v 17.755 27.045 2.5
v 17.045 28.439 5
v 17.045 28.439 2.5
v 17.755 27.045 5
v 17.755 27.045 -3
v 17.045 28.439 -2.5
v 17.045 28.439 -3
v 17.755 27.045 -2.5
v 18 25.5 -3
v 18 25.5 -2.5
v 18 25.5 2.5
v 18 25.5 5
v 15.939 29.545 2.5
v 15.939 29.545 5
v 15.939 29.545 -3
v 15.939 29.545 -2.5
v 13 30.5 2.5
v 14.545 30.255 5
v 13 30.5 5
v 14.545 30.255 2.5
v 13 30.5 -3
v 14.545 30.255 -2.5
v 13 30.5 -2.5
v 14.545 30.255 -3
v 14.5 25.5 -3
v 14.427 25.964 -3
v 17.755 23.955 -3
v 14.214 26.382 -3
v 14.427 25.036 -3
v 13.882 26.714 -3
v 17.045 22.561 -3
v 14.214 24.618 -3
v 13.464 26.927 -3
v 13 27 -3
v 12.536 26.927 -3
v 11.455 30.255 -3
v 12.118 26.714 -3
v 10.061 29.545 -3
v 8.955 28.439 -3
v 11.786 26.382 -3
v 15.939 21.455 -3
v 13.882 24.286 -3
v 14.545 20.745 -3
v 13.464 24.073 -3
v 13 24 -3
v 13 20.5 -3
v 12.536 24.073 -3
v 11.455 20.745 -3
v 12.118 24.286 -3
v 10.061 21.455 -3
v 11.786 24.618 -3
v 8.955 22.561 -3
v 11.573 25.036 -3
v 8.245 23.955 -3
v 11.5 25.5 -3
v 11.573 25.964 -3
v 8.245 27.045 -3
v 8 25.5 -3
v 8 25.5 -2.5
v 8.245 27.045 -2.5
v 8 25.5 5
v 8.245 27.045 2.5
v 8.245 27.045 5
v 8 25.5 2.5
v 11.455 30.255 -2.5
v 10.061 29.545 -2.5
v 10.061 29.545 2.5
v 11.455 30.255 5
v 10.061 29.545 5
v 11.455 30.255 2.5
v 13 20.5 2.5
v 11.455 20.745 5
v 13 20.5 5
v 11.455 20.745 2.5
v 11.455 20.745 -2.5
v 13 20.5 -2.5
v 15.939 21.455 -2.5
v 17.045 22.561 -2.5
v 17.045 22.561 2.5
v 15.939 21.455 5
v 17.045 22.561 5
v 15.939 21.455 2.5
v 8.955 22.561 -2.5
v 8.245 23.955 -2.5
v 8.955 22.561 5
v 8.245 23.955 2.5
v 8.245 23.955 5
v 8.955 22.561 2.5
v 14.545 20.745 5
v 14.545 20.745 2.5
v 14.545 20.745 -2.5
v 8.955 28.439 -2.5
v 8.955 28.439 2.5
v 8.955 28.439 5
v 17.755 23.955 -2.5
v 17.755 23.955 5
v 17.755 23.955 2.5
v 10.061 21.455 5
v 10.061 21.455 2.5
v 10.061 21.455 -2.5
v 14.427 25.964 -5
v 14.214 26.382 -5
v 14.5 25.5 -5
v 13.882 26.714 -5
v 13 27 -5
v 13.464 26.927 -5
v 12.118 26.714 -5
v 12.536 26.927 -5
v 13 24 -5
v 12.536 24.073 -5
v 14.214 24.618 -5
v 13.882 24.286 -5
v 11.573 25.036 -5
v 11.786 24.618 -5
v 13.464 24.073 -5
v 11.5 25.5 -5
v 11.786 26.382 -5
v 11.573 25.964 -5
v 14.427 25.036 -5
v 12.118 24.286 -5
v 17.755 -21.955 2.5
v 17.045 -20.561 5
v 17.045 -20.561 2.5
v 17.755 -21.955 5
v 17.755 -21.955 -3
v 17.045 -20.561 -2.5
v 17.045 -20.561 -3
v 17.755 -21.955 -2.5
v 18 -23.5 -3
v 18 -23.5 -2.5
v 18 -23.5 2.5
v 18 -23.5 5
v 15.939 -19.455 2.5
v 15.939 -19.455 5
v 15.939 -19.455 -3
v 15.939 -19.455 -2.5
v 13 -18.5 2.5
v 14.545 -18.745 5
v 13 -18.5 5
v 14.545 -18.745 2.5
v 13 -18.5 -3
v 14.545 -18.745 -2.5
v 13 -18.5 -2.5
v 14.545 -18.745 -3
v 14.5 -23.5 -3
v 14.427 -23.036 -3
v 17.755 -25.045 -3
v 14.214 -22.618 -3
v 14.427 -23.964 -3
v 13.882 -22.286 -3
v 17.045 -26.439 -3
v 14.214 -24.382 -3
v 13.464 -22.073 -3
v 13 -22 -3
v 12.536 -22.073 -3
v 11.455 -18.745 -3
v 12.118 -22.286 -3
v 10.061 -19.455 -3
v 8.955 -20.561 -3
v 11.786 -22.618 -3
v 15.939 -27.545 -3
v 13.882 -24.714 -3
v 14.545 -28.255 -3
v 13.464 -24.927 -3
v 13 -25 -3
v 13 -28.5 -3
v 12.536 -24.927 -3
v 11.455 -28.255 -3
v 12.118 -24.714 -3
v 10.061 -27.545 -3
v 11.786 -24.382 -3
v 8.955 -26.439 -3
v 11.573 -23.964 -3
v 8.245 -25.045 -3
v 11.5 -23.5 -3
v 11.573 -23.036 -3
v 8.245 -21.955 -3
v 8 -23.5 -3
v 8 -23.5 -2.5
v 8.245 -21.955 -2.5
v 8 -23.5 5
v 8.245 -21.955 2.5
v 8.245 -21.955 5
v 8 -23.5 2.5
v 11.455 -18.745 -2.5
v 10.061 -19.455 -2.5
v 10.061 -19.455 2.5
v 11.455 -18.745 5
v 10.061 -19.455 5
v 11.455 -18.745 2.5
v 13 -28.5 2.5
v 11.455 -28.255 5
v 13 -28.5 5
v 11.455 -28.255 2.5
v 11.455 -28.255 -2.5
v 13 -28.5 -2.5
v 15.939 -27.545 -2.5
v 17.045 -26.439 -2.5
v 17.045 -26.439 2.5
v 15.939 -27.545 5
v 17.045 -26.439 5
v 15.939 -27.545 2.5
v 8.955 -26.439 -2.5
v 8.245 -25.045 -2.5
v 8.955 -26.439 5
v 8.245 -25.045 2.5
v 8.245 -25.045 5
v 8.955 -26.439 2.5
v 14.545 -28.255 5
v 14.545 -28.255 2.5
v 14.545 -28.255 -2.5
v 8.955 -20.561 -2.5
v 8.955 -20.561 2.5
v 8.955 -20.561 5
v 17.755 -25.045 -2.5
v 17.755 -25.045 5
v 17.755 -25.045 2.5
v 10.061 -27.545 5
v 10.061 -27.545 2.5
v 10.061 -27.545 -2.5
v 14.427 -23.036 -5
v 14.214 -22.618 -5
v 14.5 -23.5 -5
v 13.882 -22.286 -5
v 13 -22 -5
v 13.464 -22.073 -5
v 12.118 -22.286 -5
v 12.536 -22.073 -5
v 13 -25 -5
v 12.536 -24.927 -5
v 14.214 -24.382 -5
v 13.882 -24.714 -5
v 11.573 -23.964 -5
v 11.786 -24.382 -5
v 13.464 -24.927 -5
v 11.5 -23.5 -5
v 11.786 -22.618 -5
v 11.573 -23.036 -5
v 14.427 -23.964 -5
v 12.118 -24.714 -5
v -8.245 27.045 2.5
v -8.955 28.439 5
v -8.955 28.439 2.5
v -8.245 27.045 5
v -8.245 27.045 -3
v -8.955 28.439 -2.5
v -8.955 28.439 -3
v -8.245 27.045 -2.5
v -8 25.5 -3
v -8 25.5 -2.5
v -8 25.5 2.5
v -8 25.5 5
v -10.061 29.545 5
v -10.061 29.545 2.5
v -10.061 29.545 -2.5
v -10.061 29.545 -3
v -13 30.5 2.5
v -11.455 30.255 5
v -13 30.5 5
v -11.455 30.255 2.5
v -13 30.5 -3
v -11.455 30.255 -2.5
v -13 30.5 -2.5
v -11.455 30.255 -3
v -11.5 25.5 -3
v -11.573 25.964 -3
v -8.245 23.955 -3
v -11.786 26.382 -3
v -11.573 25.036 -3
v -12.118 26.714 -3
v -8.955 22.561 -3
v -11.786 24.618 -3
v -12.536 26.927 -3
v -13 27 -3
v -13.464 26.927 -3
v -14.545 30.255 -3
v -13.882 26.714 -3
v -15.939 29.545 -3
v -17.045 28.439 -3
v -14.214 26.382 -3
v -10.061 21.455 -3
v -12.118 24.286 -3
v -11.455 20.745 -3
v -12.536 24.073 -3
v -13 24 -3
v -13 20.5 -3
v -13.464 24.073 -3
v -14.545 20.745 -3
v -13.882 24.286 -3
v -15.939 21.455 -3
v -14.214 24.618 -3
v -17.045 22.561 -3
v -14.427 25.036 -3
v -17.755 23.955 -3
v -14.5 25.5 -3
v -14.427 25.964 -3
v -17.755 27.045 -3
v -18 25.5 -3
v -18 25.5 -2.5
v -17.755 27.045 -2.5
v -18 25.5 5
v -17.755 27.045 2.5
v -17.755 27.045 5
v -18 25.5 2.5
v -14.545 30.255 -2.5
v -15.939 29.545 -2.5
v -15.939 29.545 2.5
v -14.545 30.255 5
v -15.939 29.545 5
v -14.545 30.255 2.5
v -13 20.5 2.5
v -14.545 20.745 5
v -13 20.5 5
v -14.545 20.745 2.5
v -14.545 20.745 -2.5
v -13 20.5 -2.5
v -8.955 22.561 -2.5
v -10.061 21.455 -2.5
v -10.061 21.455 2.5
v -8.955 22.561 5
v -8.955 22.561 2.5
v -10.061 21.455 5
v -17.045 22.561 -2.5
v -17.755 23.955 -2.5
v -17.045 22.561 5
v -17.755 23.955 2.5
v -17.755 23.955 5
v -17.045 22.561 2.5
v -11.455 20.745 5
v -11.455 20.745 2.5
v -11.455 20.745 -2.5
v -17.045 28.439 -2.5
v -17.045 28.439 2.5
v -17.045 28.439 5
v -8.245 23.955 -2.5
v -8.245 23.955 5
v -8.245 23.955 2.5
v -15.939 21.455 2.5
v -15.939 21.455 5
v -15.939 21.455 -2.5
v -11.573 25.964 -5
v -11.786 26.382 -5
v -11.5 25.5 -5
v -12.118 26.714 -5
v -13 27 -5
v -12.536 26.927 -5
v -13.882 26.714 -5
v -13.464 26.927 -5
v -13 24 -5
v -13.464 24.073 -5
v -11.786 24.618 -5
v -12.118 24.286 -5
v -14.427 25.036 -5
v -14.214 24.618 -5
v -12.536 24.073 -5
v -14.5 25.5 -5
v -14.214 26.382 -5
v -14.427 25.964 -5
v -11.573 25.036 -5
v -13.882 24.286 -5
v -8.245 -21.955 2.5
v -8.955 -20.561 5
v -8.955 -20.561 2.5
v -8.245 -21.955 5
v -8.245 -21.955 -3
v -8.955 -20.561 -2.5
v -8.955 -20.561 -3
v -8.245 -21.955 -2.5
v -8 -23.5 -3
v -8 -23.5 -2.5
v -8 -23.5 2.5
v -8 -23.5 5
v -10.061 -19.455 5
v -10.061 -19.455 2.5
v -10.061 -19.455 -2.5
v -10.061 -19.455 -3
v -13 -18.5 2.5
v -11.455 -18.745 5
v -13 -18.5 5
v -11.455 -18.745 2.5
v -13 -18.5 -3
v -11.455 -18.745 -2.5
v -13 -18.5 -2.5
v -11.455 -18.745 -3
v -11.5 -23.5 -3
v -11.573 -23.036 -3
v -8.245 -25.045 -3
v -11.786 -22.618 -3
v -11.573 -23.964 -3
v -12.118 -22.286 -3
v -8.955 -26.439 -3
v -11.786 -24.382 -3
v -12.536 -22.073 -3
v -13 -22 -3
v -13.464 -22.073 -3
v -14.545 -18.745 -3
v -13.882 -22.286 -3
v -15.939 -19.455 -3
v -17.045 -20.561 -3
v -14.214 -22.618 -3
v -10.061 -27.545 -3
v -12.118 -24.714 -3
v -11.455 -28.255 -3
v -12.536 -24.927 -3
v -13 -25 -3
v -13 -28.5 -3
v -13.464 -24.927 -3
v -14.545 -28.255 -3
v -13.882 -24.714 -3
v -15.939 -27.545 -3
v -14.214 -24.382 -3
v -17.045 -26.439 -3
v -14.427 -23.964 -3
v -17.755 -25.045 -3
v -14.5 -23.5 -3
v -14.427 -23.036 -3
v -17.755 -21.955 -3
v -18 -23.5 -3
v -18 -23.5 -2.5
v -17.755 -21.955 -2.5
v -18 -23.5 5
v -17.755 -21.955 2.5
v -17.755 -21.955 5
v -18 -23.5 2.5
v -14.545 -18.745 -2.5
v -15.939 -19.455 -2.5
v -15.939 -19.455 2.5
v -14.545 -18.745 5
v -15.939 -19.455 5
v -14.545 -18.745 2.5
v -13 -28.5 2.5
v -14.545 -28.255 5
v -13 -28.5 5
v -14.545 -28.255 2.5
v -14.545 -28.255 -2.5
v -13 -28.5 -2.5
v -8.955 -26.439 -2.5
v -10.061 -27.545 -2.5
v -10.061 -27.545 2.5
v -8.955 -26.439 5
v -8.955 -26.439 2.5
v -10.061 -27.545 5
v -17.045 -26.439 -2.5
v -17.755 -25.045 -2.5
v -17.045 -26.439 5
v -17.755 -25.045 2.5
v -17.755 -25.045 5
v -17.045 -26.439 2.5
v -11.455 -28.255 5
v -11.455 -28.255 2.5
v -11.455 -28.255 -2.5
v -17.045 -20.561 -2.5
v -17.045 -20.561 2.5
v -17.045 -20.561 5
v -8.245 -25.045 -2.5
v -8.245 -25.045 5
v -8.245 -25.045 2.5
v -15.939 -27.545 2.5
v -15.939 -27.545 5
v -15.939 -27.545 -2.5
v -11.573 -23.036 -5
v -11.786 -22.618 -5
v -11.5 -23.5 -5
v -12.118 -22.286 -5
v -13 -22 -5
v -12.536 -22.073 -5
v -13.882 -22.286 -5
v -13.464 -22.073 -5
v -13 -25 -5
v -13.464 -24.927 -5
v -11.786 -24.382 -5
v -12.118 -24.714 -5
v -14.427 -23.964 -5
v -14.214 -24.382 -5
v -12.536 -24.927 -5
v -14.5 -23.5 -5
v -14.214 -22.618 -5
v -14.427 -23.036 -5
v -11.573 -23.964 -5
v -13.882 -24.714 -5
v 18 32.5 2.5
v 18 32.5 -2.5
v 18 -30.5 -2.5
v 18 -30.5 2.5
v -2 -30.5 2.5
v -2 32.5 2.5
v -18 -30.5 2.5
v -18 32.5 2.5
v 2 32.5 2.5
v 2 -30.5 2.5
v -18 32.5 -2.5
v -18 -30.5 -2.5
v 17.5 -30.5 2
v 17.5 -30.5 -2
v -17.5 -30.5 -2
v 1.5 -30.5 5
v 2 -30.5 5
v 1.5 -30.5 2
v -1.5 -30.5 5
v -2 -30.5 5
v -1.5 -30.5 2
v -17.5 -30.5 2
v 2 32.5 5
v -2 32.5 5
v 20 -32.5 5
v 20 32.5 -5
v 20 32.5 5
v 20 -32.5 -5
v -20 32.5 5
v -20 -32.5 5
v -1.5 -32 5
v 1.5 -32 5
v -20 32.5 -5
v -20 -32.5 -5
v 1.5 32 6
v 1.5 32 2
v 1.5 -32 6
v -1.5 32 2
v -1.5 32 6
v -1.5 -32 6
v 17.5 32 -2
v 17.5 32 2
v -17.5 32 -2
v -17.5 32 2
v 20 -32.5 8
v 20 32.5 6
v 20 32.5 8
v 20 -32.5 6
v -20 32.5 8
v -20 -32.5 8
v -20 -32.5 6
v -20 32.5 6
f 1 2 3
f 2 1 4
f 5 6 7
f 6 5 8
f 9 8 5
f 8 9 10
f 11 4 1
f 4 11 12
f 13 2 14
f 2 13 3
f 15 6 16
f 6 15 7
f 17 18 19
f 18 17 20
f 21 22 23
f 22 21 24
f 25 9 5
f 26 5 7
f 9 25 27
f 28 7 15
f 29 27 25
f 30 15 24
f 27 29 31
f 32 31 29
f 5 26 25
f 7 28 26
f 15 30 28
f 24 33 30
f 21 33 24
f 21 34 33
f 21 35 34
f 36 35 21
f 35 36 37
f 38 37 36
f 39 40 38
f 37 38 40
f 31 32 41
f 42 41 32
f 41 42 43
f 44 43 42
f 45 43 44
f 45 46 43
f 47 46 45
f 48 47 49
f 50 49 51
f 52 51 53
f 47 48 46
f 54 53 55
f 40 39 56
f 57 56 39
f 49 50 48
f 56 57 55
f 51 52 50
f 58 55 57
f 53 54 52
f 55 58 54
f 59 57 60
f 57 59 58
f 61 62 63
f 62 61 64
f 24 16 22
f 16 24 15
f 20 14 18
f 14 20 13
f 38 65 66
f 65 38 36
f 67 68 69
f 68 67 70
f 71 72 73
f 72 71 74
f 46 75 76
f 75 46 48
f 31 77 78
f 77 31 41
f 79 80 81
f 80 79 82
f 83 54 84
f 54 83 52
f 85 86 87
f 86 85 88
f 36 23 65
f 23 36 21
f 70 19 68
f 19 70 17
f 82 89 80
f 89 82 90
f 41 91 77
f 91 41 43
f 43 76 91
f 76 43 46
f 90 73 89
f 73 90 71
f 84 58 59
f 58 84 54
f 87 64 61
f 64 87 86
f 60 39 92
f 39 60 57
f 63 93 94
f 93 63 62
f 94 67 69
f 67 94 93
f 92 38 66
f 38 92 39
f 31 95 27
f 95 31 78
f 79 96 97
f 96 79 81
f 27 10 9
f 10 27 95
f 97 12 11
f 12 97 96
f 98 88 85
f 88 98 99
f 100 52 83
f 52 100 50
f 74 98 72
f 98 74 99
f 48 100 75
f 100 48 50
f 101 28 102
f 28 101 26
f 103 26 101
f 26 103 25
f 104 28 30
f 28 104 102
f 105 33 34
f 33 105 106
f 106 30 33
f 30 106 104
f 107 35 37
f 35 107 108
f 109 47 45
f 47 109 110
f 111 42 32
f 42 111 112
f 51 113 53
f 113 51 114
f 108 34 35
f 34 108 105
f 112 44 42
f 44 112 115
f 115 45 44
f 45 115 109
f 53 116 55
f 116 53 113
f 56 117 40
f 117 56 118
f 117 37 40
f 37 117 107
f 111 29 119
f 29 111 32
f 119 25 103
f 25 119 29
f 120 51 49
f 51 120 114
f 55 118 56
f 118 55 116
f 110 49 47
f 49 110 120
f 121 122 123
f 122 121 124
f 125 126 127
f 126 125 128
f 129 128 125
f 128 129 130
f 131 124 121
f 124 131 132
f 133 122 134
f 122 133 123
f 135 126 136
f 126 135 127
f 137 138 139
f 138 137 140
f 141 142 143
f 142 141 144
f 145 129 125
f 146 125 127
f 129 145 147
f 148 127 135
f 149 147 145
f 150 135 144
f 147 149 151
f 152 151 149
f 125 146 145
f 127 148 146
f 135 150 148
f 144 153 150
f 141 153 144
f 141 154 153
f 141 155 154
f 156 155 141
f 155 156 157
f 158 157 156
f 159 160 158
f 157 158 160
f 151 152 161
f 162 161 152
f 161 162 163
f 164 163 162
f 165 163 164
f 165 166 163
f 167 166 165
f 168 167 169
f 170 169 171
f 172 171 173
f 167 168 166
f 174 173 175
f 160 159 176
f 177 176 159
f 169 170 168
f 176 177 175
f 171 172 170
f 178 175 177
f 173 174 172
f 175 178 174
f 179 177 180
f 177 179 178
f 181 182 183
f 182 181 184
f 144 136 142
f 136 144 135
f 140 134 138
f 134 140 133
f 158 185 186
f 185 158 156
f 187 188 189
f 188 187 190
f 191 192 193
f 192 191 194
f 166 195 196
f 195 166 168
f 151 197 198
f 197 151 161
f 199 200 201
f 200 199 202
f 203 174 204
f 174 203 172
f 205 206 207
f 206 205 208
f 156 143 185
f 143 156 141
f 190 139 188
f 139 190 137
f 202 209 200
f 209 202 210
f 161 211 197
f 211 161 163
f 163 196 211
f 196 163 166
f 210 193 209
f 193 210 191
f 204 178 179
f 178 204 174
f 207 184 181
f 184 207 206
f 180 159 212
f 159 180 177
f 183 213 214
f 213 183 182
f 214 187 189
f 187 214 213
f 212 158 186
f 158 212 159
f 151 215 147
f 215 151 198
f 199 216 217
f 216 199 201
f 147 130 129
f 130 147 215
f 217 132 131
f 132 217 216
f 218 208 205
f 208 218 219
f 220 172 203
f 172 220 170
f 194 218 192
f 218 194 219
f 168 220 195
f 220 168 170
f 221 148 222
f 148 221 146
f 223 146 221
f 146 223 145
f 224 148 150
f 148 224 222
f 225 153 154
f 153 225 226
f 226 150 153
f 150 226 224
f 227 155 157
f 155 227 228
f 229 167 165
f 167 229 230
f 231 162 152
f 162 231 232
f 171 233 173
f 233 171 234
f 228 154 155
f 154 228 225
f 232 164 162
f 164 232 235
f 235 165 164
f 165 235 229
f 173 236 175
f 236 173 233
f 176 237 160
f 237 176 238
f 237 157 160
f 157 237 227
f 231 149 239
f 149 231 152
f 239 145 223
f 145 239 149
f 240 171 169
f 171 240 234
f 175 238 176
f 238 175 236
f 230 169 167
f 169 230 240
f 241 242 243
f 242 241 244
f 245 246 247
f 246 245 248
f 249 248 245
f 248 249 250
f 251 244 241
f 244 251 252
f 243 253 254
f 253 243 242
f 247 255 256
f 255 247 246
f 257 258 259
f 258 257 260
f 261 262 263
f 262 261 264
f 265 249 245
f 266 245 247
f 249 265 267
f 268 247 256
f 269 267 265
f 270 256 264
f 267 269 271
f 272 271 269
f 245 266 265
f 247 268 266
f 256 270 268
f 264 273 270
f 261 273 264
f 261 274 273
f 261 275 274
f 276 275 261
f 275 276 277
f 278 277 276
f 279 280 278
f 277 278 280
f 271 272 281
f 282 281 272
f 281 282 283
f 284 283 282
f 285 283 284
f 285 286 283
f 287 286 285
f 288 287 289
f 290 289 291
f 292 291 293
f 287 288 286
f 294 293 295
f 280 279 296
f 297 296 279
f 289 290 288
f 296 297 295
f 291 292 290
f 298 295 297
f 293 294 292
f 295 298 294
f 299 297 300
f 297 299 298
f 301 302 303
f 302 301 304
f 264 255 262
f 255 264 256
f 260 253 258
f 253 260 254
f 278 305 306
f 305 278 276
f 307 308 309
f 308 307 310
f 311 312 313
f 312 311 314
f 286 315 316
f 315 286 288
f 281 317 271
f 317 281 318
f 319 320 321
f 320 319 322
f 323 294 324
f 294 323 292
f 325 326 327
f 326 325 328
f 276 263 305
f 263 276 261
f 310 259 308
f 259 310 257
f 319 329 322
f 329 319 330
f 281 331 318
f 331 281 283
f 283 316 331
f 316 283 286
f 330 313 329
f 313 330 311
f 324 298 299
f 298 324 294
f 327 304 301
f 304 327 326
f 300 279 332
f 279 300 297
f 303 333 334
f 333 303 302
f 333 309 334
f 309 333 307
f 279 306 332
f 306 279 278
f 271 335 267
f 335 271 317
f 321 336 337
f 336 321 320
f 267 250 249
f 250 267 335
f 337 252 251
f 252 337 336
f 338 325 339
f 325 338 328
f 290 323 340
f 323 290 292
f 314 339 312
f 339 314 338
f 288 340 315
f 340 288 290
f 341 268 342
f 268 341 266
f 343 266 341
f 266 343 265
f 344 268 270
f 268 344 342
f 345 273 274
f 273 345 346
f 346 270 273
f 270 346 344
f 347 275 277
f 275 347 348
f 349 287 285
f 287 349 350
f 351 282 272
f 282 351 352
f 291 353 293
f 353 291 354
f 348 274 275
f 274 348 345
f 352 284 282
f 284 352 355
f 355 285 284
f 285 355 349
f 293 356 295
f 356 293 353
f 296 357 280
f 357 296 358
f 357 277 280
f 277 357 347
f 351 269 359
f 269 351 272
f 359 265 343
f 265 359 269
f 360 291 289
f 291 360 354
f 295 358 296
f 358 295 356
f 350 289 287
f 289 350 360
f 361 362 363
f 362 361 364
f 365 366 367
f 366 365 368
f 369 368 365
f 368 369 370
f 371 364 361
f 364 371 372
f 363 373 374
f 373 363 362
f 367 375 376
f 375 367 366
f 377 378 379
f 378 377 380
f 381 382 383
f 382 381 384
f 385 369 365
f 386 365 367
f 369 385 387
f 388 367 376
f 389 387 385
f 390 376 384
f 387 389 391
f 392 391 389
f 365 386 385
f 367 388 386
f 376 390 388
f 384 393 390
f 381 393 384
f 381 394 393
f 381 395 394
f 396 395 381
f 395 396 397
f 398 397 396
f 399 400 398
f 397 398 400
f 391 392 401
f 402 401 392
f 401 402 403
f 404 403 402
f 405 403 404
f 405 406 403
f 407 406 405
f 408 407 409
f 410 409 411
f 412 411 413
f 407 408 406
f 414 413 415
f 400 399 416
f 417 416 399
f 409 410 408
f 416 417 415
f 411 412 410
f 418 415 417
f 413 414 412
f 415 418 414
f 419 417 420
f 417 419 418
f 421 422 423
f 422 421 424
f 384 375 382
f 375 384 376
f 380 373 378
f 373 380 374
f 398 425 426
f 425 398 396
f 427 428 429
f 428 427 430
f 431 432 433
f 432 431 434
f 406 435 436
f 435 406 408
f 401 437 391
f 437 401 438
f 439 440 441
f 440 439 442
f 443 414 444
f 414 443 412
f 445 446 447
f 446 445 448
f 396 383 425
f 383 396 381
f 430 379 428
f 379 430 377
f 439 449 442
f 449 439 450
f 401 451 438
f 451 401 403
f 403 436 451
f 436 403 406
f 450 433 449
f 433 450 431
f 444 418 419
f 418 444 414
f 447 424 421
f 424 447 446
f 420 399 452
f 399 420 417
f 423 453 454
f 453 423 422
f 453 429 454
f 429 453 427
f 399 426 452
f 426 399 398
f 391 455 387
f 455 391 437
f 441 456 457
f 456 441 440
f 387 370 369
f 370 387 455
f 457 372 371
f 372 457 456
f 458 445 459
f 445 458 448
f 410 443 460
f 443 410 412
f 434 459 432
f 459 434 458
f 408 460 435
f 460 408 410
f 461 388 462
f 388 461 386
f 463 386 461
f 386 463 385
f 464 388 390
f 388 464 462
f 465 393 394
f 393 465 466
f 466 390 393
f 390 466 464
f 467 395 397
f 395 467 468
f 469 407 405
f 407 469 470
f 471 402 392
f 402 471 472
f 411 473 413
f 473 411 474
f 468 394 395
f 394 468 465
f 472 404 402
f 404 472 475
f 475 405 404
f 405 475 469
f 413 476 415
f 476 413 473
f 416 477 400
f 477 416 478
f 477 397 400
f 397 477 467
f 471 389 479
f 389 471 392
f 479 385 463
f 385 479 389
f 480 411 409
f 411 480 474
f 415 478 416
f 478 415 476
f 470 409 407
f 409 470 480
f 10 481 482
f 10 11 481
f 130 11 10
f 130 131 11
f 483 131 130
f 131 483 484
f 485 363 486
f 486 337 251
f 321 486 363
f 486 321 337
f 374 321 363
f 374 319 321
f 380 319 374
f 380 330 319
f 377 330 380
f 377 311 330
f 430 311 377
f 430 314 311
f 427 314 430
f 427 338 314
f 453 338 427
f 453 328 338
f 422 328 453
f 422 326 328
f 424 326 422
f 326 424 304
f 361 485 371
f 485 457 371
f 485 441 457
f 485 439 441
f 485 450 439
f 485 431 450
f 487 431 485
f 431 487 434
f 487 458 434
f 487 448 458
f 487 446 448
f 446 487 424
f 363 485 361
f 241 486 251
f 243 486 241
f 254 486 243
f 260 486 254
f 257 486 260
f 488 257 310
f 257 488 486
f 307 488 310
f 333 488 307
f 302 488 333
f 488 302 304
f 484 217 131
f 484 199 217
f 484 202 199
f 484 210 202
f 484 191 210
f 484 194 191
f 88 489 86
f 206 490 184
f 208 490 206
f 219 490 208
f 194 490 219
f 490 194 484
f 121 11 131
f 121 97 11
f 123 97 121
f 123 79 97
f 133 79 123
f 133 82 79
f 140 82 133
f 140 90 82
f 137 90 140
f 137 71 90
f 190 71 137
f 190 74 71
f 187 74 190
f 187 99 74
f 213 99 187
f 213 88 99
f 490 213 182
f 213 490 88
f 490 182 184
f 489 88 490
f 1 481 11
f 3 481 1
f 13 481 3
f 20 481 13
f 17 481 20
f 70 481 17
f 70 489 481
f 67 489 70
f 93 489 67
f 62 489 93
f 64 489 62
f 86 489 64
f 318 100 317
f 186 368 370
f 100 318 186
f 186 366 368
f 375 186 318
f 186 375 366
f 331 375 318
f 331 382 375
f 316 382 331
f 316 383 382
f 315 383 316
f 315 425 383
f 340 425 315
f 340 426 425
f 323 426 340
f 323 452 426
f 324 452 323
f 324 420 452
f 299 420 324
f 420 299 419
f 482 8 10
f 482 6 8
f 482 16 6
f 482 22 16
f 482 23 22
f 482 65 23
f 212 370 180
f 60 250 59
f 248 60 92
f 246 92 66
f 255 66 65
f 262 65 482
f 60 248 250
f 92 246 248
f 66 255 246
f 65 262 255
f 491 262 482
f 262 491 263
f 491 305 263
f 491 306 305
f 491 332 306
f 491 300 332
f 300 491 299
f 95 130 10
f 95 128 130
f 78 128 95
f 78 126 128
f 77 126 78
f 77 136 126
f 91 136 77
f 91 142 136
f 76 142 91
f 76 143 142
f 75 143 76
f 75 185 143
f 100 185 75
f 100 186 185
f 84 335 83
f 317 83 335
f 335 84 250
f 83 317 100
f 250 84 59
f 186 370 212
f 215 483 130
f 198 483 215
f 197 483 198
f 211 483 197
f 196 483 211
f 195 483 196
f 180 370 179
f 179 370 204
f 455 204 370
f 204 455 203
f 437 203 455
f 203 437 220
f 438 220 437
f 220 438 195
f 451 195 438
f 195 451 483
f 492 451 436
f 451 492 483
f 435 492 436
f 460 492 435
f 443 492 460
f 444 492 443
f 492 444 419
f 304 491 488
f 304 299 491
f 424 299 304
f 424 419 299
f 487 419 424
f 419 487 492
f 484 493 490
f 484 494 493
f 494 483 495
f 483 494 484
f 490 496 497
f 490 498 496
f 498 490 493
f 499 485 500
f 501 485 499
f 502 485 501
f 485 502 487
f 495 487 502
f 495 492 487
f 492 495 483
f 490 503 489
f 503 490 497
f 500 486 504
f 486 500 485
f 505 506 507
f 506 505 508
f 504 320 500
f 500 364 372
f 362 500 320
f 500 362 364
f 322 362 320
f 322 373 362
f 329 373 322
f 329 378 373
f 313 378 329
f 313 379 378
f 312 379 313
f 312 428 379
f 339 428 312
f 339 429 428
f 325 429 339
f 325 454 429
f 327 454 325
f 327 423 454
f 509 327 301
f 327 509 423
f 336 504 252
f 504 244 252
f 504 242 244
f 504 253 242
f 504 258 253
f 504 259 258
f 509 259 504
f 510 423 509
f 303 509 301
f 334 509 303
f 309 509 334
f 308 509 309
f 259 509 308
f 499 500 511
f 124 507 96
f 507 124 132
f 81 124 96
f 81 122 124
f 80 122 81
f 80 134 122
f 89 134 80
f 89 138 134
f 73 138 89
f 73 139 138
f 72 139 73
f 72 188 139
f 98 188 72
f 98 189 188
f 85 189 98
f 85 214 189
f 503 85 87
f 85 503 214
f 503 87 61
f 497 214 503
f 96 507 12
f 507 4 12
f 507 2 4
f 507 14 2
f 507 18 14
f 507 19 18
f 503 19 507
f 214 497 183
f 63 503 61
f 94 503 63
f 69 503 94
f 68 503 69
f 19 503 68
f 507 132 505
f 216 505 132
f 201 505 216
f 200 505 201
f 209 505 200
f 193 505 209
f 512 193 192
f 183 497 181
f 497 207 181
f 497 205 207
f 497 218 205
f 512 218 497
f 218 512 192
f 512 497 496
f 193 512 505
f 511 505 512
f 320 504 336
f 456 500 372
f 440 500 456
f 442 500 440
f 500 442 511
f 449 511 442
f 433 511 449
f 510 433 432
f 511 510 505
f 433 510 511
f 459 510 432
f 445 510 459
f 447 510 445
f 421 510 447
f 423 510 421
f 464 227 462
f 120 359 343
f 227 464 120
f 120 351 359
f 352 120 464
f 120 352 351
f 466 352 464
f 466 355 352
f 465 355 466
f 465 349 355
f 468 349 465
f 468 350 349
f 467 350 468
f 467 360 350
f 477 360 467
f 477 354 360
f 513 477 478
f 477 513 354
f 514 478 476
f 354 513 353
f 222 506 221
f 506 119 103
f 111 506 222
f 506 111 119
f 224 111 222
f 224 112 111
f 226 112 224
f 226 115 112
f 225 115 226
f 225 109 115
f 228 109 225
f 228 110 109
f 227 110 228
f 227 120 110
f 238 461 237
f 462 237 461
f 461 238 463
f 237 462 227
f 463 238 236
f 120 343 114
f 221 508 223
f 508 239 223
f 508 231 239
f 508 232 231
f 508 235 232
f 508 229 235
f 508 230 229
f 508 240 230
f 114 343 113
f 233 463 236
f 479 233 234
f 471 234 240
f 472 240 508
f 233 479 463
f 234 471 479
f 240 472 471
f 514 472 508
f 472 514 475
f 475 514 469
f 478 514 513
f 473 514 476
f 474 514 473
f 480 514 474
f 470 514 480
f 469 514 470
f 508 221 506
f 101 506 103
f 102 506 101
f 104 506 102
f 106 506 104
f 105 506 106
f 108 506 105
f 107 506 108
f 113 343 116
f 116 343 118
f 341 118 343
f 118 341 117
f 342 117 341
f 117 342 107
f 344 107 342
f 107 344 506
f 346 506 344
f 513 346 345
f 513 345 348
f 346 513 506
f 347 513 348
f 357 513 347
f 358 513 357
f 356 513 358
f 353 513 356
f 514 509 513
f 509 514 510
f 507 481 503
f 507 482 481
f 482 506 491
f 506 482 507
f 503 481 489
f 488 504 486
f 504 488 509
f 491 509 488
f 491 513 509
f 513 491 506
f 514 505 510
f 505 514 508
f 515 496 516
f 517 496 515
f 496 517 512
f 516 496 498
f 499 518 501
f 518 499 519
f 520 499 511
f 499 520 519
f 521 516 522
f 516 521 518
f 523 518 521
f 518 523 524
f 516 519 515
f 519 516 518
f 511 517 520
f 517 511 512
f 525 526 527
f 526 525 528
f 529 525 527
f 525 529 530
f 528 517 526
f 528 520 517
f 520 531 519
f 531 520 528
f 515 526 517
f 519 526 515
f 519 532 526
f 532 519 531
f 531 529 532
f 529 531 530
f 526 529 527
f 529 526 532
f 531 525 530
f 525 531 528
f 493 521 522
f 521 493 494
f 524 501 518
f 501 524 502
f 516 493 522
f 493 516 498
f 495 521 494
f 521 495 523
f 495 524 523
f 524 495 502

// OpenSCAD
width = 40;
length = 65;
height = 10;
thickness = 2;
loose = 0.5;
male = true;
female = true;
$fit = height / 2;

module boltHole()
{
    cylinder(height, 5, 5, $fn = 20);
    translate([ 0, 0, 0 - height ]) cylinder(h = height * 2, r1 = 1.5, r2 = 1.5, $fn = 20);
};

if (female)
{
    difference()
    {
        cube([ width, length, height ], true);
        translate([ 0, thickness, height / 2 - $fit ])
        {
            cube([ width - thickness * 2, length, $fit ], true);
            z = 0 - height / 2 + thickness;
            r = width / 2 - $fit - thickness;
            l = 0 - r;
            up = length / 2 - $fit - thickness * 2;
            down = 0 - (length / 2 - $fit - thickness);
            translate([ 0, 0, $fit - thickness / 2 ]) cube([ thickness * 2, length, thickness * 2 ], true);
            translate([ r, up, z ]) boltHole();
            translate([ r, down, z ]) boltHole();
            translate([ l, up, z ]) boltHole();
            translate([ l, down, z ]) boltHole();
        }
    }
}

if (male)
{
    cube([ (width - thickness * 2) - loose * 2, length - loose * 2, $fit - loose * 2 ], true);
    translate([ 0, 0, $fit - thickness / 2 ])
    {
        cube([ thickness * 2 - loose * 2, length - loose * 2, thickness * 2 + loose * 2 ], true);
        translate([ 0, 0, $fit - thickness ]) cube([ width, length, 2 ], true);
    }
}
